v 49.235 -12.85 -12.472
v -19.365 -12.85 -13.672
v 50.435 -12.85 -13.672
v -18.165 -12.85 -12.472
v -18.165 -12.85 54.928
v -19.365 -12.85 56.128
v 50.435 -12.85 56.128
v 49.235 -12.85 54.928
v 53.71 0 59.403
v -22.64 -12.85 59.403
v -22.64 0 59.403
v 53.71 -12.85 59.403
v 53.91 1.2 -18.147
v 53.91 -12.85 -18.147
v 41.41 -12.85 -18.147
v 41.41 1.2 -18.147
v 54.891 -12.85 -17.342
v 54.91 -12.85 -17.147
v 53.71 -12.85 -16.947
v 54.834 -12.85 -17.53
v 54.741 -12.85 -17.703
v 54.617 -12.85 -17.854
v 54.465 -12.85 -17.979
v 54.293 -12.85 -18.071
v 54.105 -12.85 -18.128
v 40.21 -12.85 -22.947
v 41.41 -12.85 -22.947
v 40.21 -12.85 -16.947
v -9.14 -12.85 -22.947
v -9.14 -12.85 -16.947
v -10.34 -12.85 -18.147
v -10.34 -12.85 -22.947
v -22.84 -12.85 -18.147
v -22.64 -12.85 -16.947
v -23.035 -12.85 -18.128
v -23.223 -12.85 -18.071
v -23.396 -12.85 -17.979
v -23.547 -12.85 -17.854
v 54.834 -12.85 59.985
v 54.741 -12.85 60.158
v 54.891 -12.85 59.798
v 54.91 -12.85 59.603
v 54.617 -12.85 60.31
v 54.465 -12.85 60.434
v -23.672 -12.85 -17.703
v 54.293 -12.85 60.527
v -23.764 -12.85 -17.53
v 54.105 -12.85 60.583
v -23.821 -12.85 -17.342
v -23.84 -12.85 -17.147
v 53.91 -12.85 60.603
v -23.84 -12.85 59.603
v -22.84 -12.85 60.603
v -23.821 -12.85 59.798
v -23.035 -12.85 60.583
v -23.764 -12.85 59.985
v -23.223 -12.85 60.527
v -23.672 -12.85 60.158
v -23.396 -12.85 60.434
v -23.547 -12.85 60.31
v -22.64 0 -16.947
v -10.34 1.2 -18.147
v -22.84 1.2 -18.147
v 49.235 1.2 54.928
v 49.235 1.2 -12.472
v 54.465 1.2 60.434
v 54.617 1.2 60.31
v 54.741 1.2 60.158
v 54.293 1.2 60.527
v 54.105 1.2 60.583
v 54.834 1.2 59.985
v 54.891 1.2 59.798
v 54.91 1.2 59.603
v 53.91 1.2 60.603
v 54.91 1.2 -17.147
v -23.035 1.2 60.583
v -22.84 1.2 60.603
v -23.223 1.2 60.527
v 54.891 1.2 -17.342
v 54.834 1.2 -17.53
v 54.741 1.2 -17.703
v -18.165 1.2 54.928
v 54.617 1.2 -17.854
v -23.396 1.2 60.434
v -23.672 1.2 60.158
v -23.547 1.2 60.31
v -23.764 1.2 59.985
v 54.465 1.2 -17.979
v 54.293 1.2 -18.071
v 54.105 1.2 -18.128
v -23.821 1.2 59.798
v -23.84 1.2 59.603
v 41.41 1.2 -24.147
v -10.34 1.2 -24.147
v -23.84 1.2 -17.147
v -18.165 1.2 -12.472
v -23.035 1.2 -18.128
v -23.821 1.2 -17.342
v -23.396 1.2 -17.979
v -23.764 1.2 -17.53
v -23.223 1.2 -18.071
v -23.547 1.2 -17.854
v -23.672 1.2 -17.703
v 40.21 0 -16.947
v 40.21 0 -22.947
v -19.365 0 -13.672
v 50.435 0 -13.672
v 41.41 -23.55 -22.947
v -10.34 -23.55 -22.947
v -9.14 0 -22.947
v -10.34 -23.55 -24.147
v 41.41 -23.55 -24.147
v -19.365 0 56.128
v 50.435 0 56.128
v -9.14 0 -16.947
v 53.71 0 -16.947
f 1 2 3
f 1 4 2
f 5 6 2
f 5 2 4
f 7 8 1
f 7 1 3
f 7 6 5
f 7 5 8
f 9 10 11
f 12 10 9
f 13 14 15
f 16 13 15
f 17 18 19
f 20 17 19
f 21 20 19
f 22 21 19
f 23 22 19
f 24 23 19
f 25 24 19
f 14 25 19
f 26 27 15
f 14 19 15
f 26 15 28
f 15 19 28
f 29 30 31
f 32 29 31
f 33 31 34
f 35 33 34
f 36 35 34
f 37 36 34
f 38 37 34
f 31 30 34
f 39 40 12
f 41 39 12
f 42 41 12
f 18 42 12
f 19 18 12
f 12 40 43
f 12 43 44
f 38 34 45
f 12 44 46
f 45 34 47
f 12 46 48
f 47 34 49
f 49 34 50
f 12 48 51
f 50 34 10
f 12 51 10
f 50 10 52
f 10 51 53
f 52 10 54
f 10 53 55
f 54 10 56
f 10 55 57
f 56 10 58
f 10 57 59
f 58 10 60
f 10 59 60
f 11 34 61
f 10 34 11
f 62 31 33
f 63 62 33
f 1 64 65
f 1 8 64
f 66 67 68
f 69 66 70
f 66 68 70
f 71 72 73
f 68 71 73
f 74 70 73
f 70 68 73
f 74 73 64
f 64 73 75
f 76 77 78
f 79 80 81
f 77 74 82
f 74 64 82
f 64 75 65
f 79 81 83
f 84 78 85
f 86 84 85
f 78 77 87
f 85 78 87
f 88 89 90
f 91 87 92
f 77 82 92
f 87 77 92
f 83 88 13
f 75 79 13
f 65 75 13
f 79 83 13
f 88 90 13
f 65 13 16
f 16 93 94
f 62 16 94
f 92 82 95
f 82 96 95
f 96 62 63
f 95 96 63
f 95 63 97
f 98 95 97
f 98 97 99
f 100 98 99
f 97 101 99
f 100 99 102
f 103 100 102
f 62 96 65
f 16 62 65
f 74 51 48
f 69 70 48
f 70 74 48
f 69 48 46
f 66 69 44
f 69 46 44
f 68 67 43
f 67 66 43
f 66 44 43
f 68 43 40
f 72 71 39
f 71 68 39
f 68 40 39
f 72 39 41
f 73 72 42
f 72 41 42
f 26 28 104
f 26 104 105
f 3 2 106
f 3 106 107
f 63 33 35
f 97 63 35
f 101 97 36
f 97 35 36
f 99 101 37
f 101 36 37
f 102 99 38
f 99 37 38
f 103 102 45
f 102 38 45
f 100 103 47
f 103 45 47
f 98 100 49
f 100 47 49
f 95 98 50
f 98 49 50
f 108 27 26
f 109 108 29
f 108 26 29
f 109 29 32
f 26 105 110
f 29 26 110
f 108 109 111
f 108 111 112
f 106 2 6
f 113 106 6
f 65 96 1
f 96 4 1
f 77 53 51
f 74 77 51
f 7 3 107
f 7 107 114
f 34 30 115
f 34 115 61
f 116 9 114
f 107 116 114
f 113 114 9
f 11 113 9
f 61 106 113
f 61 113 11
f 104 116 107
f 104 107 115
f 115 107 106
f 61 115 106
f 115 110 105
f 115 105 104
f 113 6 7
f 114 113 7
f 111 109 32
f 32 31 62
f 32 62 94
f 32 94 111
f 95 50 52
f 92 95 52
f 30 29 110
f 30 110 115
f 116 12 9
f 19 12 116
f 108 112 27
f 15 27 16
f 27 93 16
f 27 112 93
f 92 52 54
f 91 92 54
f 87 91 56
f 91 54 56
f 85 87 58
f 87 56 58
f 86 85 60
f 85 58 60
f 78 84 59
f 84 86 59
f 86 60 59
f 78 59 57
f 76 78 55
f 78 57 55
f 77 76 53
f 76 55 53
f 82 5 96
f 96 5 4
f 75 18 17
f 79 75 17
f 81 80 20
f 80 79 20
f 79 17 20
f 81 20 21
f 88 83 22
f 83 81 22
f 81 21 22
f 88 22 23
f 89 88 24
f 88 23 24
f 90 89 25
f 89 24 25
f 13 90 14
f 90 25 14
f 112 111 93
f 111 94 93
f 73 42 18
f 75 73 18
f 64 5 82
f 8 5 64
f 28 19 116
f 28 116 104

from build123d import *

# Parameters (mm, degrees)
SKETCH1_W           = 67.4
SKETCH1_H           = 67.4
BOSS_EXTRUDE1_DEPTH = 1.2
BOSS_EXTRUDE2_START = 12.85
SKETCH2_W           = 69.8
SKETCH2_H           = 69.8
SKETCH2_W_2         = 67.4
SKETCH2_H_2         = 67.4
BOSS_EXTRUDE2_DEPTH = 12.85
BOSS_EXTRUDE3_DEPTH = 10.7


with BuildPart() as part:
    # Sketch1 → Boss-Extrude1 (new body)
    with BuildSketch(Plane(origin=(0, 0, 0), x_dir=(1, 0, 0), z_dir=(0, 1, 0))):
        with BuildLine():
            Line((-22.840165497, 18.147363877), (-10.340165497, 18.147363877))
            Line((-10.340165497, 18.147363877), (-10.340165497, 24.147363877))
            Line((-10.340165497, 24.147363877), (41.409834503, 24.147363877))
            Line((41.409834503, 24.147363877), (41.409834503, 18.147363877))
            Line((41.409834503, 18.147363877), (53.909834503, 18.147363877))
            ThreePointArc((53.909834503, 18.147363877), (54.616941284, 17.854470658), (54.909834503, 17.147363877))
            Line((54.909834503, 17.147363877), (54.909834503, -59.602636123))
            ThreePointArc((54.909834503, -59.602636123), (54.616941284, -60.309742904), (53.909834503, -60.602636123))
            Line((53.909834503, -60.602636123), (-22.840165497, -60.602636123))
            ThreePointArc((-22.840165497, -60.602636123), (-23.547272279, -60.309742904), (-23.840165497, -59.602636123))
            Line((-23.840165497, -59.602636123), (-23.840165497, 17.147363877))
            ThreePointArc((-23.840165497, 17.147363877), (-23.547272279, 17.854470658), (-22.840165497, 18.147363877))
        make_face()
        with Locations((15.534834503, -21.227636123)):
            Rectangle(SKETCH1_W, SKETCH1_H, mode=Mode.SUBTRACT)
    extrude(amount=BOSS_EXTRUDE1_DEPTH)

    # Sketch2 → Boss-Extrude2 (add)
    # profile 1 of 2: a face of its own
    with BuildSketch(Plane.XZ.offset(BOSS_EXTRUDE2_START)):
        with BuildLine():
            Line((-10.340165497, -24.147363877), (41.409834503, -24.147363877))
            Line((41.409834503, -24.147363877), (41.409834503, -18.147363877))
            Line((41.409834503, -18.147363877), (53.909834503, -18.147363877))
            ThreePointArc((53.909834503, -18.147363877), (54.616941284, -17.854470658), (54.909834503, -17.147363877))
            Line((54.909834503, -17.147363877), (54.909834503, 59.602636123))
            ThreePointArc((54.909834503, 59.602636123), (54.616941284, 60.309742904), (53.909834503, 60.602636123))
            Line((53.909834503, 60.602636123), (-22.840165497, 60.602636123))
            ThreePointArc((-22.840165497, 60.602636123), (-23.547272279, 60.309742904), (-23.840165497, 59.602636123))
            Line((-23.840165497, 59.602636123), (-23.840165497, -17.147363877))
            ThreePointArc((-23.840165497, -17.147363877), (-23.547272279, -17.854470658), (-22.840165497, -18.147363877))
            Line((-22.840165497, -18.147363877), (-10.340165497, -18.147363877))
            Line((-10.340165497, -18.147363877), (-10.340165497, -24.147363877))
        make_face()
        Polygon((40.209834503, -16.947363877), (40.209834503, -22.947363877), (-9.140165497, -22.947363877), (-9.140165497, -16.947363877), (-22.640165497, -16.947363877), (-22.640165497, 59.402636123), (53.709834503, 59.402636123), (53.709834503, -16.947363877), align=None, mode=Mode.SUBTRACT)
    # profile 2 of 2: a face of its own
    with BuildSketch(Plane.XZ.offset(BOSS_EXTRUDE2_START)):
        with Locations((15.534834503, 21.227636123)):
            Rectangle(SKETCH2_W, SKETCH2_H)
        with Locations((15.534834503, 21.227636123)):
            Rectangle(SKETCH2_W_2, SKETCH2_H_2, mode=Mode.SUBTRACT)
    extrude(amount=-BOSS_EXTRUDE2_DEPTH)

    # Sketch3 → Boss-Extrude3 (add)
    with BuildSketch(Plane.XZ.offset(12.85)):
        Polygon((-9.140165497, -22.947363877), (-10.340165497, -22.947363877), (-10.340165497, -24.147363877), (41.409834503, -24.147363877), (41.409834503, -22.947363877), align=None)
    extrude(amount=BOSS_EXTRUDE3_DEPTH)


solid = part.part
